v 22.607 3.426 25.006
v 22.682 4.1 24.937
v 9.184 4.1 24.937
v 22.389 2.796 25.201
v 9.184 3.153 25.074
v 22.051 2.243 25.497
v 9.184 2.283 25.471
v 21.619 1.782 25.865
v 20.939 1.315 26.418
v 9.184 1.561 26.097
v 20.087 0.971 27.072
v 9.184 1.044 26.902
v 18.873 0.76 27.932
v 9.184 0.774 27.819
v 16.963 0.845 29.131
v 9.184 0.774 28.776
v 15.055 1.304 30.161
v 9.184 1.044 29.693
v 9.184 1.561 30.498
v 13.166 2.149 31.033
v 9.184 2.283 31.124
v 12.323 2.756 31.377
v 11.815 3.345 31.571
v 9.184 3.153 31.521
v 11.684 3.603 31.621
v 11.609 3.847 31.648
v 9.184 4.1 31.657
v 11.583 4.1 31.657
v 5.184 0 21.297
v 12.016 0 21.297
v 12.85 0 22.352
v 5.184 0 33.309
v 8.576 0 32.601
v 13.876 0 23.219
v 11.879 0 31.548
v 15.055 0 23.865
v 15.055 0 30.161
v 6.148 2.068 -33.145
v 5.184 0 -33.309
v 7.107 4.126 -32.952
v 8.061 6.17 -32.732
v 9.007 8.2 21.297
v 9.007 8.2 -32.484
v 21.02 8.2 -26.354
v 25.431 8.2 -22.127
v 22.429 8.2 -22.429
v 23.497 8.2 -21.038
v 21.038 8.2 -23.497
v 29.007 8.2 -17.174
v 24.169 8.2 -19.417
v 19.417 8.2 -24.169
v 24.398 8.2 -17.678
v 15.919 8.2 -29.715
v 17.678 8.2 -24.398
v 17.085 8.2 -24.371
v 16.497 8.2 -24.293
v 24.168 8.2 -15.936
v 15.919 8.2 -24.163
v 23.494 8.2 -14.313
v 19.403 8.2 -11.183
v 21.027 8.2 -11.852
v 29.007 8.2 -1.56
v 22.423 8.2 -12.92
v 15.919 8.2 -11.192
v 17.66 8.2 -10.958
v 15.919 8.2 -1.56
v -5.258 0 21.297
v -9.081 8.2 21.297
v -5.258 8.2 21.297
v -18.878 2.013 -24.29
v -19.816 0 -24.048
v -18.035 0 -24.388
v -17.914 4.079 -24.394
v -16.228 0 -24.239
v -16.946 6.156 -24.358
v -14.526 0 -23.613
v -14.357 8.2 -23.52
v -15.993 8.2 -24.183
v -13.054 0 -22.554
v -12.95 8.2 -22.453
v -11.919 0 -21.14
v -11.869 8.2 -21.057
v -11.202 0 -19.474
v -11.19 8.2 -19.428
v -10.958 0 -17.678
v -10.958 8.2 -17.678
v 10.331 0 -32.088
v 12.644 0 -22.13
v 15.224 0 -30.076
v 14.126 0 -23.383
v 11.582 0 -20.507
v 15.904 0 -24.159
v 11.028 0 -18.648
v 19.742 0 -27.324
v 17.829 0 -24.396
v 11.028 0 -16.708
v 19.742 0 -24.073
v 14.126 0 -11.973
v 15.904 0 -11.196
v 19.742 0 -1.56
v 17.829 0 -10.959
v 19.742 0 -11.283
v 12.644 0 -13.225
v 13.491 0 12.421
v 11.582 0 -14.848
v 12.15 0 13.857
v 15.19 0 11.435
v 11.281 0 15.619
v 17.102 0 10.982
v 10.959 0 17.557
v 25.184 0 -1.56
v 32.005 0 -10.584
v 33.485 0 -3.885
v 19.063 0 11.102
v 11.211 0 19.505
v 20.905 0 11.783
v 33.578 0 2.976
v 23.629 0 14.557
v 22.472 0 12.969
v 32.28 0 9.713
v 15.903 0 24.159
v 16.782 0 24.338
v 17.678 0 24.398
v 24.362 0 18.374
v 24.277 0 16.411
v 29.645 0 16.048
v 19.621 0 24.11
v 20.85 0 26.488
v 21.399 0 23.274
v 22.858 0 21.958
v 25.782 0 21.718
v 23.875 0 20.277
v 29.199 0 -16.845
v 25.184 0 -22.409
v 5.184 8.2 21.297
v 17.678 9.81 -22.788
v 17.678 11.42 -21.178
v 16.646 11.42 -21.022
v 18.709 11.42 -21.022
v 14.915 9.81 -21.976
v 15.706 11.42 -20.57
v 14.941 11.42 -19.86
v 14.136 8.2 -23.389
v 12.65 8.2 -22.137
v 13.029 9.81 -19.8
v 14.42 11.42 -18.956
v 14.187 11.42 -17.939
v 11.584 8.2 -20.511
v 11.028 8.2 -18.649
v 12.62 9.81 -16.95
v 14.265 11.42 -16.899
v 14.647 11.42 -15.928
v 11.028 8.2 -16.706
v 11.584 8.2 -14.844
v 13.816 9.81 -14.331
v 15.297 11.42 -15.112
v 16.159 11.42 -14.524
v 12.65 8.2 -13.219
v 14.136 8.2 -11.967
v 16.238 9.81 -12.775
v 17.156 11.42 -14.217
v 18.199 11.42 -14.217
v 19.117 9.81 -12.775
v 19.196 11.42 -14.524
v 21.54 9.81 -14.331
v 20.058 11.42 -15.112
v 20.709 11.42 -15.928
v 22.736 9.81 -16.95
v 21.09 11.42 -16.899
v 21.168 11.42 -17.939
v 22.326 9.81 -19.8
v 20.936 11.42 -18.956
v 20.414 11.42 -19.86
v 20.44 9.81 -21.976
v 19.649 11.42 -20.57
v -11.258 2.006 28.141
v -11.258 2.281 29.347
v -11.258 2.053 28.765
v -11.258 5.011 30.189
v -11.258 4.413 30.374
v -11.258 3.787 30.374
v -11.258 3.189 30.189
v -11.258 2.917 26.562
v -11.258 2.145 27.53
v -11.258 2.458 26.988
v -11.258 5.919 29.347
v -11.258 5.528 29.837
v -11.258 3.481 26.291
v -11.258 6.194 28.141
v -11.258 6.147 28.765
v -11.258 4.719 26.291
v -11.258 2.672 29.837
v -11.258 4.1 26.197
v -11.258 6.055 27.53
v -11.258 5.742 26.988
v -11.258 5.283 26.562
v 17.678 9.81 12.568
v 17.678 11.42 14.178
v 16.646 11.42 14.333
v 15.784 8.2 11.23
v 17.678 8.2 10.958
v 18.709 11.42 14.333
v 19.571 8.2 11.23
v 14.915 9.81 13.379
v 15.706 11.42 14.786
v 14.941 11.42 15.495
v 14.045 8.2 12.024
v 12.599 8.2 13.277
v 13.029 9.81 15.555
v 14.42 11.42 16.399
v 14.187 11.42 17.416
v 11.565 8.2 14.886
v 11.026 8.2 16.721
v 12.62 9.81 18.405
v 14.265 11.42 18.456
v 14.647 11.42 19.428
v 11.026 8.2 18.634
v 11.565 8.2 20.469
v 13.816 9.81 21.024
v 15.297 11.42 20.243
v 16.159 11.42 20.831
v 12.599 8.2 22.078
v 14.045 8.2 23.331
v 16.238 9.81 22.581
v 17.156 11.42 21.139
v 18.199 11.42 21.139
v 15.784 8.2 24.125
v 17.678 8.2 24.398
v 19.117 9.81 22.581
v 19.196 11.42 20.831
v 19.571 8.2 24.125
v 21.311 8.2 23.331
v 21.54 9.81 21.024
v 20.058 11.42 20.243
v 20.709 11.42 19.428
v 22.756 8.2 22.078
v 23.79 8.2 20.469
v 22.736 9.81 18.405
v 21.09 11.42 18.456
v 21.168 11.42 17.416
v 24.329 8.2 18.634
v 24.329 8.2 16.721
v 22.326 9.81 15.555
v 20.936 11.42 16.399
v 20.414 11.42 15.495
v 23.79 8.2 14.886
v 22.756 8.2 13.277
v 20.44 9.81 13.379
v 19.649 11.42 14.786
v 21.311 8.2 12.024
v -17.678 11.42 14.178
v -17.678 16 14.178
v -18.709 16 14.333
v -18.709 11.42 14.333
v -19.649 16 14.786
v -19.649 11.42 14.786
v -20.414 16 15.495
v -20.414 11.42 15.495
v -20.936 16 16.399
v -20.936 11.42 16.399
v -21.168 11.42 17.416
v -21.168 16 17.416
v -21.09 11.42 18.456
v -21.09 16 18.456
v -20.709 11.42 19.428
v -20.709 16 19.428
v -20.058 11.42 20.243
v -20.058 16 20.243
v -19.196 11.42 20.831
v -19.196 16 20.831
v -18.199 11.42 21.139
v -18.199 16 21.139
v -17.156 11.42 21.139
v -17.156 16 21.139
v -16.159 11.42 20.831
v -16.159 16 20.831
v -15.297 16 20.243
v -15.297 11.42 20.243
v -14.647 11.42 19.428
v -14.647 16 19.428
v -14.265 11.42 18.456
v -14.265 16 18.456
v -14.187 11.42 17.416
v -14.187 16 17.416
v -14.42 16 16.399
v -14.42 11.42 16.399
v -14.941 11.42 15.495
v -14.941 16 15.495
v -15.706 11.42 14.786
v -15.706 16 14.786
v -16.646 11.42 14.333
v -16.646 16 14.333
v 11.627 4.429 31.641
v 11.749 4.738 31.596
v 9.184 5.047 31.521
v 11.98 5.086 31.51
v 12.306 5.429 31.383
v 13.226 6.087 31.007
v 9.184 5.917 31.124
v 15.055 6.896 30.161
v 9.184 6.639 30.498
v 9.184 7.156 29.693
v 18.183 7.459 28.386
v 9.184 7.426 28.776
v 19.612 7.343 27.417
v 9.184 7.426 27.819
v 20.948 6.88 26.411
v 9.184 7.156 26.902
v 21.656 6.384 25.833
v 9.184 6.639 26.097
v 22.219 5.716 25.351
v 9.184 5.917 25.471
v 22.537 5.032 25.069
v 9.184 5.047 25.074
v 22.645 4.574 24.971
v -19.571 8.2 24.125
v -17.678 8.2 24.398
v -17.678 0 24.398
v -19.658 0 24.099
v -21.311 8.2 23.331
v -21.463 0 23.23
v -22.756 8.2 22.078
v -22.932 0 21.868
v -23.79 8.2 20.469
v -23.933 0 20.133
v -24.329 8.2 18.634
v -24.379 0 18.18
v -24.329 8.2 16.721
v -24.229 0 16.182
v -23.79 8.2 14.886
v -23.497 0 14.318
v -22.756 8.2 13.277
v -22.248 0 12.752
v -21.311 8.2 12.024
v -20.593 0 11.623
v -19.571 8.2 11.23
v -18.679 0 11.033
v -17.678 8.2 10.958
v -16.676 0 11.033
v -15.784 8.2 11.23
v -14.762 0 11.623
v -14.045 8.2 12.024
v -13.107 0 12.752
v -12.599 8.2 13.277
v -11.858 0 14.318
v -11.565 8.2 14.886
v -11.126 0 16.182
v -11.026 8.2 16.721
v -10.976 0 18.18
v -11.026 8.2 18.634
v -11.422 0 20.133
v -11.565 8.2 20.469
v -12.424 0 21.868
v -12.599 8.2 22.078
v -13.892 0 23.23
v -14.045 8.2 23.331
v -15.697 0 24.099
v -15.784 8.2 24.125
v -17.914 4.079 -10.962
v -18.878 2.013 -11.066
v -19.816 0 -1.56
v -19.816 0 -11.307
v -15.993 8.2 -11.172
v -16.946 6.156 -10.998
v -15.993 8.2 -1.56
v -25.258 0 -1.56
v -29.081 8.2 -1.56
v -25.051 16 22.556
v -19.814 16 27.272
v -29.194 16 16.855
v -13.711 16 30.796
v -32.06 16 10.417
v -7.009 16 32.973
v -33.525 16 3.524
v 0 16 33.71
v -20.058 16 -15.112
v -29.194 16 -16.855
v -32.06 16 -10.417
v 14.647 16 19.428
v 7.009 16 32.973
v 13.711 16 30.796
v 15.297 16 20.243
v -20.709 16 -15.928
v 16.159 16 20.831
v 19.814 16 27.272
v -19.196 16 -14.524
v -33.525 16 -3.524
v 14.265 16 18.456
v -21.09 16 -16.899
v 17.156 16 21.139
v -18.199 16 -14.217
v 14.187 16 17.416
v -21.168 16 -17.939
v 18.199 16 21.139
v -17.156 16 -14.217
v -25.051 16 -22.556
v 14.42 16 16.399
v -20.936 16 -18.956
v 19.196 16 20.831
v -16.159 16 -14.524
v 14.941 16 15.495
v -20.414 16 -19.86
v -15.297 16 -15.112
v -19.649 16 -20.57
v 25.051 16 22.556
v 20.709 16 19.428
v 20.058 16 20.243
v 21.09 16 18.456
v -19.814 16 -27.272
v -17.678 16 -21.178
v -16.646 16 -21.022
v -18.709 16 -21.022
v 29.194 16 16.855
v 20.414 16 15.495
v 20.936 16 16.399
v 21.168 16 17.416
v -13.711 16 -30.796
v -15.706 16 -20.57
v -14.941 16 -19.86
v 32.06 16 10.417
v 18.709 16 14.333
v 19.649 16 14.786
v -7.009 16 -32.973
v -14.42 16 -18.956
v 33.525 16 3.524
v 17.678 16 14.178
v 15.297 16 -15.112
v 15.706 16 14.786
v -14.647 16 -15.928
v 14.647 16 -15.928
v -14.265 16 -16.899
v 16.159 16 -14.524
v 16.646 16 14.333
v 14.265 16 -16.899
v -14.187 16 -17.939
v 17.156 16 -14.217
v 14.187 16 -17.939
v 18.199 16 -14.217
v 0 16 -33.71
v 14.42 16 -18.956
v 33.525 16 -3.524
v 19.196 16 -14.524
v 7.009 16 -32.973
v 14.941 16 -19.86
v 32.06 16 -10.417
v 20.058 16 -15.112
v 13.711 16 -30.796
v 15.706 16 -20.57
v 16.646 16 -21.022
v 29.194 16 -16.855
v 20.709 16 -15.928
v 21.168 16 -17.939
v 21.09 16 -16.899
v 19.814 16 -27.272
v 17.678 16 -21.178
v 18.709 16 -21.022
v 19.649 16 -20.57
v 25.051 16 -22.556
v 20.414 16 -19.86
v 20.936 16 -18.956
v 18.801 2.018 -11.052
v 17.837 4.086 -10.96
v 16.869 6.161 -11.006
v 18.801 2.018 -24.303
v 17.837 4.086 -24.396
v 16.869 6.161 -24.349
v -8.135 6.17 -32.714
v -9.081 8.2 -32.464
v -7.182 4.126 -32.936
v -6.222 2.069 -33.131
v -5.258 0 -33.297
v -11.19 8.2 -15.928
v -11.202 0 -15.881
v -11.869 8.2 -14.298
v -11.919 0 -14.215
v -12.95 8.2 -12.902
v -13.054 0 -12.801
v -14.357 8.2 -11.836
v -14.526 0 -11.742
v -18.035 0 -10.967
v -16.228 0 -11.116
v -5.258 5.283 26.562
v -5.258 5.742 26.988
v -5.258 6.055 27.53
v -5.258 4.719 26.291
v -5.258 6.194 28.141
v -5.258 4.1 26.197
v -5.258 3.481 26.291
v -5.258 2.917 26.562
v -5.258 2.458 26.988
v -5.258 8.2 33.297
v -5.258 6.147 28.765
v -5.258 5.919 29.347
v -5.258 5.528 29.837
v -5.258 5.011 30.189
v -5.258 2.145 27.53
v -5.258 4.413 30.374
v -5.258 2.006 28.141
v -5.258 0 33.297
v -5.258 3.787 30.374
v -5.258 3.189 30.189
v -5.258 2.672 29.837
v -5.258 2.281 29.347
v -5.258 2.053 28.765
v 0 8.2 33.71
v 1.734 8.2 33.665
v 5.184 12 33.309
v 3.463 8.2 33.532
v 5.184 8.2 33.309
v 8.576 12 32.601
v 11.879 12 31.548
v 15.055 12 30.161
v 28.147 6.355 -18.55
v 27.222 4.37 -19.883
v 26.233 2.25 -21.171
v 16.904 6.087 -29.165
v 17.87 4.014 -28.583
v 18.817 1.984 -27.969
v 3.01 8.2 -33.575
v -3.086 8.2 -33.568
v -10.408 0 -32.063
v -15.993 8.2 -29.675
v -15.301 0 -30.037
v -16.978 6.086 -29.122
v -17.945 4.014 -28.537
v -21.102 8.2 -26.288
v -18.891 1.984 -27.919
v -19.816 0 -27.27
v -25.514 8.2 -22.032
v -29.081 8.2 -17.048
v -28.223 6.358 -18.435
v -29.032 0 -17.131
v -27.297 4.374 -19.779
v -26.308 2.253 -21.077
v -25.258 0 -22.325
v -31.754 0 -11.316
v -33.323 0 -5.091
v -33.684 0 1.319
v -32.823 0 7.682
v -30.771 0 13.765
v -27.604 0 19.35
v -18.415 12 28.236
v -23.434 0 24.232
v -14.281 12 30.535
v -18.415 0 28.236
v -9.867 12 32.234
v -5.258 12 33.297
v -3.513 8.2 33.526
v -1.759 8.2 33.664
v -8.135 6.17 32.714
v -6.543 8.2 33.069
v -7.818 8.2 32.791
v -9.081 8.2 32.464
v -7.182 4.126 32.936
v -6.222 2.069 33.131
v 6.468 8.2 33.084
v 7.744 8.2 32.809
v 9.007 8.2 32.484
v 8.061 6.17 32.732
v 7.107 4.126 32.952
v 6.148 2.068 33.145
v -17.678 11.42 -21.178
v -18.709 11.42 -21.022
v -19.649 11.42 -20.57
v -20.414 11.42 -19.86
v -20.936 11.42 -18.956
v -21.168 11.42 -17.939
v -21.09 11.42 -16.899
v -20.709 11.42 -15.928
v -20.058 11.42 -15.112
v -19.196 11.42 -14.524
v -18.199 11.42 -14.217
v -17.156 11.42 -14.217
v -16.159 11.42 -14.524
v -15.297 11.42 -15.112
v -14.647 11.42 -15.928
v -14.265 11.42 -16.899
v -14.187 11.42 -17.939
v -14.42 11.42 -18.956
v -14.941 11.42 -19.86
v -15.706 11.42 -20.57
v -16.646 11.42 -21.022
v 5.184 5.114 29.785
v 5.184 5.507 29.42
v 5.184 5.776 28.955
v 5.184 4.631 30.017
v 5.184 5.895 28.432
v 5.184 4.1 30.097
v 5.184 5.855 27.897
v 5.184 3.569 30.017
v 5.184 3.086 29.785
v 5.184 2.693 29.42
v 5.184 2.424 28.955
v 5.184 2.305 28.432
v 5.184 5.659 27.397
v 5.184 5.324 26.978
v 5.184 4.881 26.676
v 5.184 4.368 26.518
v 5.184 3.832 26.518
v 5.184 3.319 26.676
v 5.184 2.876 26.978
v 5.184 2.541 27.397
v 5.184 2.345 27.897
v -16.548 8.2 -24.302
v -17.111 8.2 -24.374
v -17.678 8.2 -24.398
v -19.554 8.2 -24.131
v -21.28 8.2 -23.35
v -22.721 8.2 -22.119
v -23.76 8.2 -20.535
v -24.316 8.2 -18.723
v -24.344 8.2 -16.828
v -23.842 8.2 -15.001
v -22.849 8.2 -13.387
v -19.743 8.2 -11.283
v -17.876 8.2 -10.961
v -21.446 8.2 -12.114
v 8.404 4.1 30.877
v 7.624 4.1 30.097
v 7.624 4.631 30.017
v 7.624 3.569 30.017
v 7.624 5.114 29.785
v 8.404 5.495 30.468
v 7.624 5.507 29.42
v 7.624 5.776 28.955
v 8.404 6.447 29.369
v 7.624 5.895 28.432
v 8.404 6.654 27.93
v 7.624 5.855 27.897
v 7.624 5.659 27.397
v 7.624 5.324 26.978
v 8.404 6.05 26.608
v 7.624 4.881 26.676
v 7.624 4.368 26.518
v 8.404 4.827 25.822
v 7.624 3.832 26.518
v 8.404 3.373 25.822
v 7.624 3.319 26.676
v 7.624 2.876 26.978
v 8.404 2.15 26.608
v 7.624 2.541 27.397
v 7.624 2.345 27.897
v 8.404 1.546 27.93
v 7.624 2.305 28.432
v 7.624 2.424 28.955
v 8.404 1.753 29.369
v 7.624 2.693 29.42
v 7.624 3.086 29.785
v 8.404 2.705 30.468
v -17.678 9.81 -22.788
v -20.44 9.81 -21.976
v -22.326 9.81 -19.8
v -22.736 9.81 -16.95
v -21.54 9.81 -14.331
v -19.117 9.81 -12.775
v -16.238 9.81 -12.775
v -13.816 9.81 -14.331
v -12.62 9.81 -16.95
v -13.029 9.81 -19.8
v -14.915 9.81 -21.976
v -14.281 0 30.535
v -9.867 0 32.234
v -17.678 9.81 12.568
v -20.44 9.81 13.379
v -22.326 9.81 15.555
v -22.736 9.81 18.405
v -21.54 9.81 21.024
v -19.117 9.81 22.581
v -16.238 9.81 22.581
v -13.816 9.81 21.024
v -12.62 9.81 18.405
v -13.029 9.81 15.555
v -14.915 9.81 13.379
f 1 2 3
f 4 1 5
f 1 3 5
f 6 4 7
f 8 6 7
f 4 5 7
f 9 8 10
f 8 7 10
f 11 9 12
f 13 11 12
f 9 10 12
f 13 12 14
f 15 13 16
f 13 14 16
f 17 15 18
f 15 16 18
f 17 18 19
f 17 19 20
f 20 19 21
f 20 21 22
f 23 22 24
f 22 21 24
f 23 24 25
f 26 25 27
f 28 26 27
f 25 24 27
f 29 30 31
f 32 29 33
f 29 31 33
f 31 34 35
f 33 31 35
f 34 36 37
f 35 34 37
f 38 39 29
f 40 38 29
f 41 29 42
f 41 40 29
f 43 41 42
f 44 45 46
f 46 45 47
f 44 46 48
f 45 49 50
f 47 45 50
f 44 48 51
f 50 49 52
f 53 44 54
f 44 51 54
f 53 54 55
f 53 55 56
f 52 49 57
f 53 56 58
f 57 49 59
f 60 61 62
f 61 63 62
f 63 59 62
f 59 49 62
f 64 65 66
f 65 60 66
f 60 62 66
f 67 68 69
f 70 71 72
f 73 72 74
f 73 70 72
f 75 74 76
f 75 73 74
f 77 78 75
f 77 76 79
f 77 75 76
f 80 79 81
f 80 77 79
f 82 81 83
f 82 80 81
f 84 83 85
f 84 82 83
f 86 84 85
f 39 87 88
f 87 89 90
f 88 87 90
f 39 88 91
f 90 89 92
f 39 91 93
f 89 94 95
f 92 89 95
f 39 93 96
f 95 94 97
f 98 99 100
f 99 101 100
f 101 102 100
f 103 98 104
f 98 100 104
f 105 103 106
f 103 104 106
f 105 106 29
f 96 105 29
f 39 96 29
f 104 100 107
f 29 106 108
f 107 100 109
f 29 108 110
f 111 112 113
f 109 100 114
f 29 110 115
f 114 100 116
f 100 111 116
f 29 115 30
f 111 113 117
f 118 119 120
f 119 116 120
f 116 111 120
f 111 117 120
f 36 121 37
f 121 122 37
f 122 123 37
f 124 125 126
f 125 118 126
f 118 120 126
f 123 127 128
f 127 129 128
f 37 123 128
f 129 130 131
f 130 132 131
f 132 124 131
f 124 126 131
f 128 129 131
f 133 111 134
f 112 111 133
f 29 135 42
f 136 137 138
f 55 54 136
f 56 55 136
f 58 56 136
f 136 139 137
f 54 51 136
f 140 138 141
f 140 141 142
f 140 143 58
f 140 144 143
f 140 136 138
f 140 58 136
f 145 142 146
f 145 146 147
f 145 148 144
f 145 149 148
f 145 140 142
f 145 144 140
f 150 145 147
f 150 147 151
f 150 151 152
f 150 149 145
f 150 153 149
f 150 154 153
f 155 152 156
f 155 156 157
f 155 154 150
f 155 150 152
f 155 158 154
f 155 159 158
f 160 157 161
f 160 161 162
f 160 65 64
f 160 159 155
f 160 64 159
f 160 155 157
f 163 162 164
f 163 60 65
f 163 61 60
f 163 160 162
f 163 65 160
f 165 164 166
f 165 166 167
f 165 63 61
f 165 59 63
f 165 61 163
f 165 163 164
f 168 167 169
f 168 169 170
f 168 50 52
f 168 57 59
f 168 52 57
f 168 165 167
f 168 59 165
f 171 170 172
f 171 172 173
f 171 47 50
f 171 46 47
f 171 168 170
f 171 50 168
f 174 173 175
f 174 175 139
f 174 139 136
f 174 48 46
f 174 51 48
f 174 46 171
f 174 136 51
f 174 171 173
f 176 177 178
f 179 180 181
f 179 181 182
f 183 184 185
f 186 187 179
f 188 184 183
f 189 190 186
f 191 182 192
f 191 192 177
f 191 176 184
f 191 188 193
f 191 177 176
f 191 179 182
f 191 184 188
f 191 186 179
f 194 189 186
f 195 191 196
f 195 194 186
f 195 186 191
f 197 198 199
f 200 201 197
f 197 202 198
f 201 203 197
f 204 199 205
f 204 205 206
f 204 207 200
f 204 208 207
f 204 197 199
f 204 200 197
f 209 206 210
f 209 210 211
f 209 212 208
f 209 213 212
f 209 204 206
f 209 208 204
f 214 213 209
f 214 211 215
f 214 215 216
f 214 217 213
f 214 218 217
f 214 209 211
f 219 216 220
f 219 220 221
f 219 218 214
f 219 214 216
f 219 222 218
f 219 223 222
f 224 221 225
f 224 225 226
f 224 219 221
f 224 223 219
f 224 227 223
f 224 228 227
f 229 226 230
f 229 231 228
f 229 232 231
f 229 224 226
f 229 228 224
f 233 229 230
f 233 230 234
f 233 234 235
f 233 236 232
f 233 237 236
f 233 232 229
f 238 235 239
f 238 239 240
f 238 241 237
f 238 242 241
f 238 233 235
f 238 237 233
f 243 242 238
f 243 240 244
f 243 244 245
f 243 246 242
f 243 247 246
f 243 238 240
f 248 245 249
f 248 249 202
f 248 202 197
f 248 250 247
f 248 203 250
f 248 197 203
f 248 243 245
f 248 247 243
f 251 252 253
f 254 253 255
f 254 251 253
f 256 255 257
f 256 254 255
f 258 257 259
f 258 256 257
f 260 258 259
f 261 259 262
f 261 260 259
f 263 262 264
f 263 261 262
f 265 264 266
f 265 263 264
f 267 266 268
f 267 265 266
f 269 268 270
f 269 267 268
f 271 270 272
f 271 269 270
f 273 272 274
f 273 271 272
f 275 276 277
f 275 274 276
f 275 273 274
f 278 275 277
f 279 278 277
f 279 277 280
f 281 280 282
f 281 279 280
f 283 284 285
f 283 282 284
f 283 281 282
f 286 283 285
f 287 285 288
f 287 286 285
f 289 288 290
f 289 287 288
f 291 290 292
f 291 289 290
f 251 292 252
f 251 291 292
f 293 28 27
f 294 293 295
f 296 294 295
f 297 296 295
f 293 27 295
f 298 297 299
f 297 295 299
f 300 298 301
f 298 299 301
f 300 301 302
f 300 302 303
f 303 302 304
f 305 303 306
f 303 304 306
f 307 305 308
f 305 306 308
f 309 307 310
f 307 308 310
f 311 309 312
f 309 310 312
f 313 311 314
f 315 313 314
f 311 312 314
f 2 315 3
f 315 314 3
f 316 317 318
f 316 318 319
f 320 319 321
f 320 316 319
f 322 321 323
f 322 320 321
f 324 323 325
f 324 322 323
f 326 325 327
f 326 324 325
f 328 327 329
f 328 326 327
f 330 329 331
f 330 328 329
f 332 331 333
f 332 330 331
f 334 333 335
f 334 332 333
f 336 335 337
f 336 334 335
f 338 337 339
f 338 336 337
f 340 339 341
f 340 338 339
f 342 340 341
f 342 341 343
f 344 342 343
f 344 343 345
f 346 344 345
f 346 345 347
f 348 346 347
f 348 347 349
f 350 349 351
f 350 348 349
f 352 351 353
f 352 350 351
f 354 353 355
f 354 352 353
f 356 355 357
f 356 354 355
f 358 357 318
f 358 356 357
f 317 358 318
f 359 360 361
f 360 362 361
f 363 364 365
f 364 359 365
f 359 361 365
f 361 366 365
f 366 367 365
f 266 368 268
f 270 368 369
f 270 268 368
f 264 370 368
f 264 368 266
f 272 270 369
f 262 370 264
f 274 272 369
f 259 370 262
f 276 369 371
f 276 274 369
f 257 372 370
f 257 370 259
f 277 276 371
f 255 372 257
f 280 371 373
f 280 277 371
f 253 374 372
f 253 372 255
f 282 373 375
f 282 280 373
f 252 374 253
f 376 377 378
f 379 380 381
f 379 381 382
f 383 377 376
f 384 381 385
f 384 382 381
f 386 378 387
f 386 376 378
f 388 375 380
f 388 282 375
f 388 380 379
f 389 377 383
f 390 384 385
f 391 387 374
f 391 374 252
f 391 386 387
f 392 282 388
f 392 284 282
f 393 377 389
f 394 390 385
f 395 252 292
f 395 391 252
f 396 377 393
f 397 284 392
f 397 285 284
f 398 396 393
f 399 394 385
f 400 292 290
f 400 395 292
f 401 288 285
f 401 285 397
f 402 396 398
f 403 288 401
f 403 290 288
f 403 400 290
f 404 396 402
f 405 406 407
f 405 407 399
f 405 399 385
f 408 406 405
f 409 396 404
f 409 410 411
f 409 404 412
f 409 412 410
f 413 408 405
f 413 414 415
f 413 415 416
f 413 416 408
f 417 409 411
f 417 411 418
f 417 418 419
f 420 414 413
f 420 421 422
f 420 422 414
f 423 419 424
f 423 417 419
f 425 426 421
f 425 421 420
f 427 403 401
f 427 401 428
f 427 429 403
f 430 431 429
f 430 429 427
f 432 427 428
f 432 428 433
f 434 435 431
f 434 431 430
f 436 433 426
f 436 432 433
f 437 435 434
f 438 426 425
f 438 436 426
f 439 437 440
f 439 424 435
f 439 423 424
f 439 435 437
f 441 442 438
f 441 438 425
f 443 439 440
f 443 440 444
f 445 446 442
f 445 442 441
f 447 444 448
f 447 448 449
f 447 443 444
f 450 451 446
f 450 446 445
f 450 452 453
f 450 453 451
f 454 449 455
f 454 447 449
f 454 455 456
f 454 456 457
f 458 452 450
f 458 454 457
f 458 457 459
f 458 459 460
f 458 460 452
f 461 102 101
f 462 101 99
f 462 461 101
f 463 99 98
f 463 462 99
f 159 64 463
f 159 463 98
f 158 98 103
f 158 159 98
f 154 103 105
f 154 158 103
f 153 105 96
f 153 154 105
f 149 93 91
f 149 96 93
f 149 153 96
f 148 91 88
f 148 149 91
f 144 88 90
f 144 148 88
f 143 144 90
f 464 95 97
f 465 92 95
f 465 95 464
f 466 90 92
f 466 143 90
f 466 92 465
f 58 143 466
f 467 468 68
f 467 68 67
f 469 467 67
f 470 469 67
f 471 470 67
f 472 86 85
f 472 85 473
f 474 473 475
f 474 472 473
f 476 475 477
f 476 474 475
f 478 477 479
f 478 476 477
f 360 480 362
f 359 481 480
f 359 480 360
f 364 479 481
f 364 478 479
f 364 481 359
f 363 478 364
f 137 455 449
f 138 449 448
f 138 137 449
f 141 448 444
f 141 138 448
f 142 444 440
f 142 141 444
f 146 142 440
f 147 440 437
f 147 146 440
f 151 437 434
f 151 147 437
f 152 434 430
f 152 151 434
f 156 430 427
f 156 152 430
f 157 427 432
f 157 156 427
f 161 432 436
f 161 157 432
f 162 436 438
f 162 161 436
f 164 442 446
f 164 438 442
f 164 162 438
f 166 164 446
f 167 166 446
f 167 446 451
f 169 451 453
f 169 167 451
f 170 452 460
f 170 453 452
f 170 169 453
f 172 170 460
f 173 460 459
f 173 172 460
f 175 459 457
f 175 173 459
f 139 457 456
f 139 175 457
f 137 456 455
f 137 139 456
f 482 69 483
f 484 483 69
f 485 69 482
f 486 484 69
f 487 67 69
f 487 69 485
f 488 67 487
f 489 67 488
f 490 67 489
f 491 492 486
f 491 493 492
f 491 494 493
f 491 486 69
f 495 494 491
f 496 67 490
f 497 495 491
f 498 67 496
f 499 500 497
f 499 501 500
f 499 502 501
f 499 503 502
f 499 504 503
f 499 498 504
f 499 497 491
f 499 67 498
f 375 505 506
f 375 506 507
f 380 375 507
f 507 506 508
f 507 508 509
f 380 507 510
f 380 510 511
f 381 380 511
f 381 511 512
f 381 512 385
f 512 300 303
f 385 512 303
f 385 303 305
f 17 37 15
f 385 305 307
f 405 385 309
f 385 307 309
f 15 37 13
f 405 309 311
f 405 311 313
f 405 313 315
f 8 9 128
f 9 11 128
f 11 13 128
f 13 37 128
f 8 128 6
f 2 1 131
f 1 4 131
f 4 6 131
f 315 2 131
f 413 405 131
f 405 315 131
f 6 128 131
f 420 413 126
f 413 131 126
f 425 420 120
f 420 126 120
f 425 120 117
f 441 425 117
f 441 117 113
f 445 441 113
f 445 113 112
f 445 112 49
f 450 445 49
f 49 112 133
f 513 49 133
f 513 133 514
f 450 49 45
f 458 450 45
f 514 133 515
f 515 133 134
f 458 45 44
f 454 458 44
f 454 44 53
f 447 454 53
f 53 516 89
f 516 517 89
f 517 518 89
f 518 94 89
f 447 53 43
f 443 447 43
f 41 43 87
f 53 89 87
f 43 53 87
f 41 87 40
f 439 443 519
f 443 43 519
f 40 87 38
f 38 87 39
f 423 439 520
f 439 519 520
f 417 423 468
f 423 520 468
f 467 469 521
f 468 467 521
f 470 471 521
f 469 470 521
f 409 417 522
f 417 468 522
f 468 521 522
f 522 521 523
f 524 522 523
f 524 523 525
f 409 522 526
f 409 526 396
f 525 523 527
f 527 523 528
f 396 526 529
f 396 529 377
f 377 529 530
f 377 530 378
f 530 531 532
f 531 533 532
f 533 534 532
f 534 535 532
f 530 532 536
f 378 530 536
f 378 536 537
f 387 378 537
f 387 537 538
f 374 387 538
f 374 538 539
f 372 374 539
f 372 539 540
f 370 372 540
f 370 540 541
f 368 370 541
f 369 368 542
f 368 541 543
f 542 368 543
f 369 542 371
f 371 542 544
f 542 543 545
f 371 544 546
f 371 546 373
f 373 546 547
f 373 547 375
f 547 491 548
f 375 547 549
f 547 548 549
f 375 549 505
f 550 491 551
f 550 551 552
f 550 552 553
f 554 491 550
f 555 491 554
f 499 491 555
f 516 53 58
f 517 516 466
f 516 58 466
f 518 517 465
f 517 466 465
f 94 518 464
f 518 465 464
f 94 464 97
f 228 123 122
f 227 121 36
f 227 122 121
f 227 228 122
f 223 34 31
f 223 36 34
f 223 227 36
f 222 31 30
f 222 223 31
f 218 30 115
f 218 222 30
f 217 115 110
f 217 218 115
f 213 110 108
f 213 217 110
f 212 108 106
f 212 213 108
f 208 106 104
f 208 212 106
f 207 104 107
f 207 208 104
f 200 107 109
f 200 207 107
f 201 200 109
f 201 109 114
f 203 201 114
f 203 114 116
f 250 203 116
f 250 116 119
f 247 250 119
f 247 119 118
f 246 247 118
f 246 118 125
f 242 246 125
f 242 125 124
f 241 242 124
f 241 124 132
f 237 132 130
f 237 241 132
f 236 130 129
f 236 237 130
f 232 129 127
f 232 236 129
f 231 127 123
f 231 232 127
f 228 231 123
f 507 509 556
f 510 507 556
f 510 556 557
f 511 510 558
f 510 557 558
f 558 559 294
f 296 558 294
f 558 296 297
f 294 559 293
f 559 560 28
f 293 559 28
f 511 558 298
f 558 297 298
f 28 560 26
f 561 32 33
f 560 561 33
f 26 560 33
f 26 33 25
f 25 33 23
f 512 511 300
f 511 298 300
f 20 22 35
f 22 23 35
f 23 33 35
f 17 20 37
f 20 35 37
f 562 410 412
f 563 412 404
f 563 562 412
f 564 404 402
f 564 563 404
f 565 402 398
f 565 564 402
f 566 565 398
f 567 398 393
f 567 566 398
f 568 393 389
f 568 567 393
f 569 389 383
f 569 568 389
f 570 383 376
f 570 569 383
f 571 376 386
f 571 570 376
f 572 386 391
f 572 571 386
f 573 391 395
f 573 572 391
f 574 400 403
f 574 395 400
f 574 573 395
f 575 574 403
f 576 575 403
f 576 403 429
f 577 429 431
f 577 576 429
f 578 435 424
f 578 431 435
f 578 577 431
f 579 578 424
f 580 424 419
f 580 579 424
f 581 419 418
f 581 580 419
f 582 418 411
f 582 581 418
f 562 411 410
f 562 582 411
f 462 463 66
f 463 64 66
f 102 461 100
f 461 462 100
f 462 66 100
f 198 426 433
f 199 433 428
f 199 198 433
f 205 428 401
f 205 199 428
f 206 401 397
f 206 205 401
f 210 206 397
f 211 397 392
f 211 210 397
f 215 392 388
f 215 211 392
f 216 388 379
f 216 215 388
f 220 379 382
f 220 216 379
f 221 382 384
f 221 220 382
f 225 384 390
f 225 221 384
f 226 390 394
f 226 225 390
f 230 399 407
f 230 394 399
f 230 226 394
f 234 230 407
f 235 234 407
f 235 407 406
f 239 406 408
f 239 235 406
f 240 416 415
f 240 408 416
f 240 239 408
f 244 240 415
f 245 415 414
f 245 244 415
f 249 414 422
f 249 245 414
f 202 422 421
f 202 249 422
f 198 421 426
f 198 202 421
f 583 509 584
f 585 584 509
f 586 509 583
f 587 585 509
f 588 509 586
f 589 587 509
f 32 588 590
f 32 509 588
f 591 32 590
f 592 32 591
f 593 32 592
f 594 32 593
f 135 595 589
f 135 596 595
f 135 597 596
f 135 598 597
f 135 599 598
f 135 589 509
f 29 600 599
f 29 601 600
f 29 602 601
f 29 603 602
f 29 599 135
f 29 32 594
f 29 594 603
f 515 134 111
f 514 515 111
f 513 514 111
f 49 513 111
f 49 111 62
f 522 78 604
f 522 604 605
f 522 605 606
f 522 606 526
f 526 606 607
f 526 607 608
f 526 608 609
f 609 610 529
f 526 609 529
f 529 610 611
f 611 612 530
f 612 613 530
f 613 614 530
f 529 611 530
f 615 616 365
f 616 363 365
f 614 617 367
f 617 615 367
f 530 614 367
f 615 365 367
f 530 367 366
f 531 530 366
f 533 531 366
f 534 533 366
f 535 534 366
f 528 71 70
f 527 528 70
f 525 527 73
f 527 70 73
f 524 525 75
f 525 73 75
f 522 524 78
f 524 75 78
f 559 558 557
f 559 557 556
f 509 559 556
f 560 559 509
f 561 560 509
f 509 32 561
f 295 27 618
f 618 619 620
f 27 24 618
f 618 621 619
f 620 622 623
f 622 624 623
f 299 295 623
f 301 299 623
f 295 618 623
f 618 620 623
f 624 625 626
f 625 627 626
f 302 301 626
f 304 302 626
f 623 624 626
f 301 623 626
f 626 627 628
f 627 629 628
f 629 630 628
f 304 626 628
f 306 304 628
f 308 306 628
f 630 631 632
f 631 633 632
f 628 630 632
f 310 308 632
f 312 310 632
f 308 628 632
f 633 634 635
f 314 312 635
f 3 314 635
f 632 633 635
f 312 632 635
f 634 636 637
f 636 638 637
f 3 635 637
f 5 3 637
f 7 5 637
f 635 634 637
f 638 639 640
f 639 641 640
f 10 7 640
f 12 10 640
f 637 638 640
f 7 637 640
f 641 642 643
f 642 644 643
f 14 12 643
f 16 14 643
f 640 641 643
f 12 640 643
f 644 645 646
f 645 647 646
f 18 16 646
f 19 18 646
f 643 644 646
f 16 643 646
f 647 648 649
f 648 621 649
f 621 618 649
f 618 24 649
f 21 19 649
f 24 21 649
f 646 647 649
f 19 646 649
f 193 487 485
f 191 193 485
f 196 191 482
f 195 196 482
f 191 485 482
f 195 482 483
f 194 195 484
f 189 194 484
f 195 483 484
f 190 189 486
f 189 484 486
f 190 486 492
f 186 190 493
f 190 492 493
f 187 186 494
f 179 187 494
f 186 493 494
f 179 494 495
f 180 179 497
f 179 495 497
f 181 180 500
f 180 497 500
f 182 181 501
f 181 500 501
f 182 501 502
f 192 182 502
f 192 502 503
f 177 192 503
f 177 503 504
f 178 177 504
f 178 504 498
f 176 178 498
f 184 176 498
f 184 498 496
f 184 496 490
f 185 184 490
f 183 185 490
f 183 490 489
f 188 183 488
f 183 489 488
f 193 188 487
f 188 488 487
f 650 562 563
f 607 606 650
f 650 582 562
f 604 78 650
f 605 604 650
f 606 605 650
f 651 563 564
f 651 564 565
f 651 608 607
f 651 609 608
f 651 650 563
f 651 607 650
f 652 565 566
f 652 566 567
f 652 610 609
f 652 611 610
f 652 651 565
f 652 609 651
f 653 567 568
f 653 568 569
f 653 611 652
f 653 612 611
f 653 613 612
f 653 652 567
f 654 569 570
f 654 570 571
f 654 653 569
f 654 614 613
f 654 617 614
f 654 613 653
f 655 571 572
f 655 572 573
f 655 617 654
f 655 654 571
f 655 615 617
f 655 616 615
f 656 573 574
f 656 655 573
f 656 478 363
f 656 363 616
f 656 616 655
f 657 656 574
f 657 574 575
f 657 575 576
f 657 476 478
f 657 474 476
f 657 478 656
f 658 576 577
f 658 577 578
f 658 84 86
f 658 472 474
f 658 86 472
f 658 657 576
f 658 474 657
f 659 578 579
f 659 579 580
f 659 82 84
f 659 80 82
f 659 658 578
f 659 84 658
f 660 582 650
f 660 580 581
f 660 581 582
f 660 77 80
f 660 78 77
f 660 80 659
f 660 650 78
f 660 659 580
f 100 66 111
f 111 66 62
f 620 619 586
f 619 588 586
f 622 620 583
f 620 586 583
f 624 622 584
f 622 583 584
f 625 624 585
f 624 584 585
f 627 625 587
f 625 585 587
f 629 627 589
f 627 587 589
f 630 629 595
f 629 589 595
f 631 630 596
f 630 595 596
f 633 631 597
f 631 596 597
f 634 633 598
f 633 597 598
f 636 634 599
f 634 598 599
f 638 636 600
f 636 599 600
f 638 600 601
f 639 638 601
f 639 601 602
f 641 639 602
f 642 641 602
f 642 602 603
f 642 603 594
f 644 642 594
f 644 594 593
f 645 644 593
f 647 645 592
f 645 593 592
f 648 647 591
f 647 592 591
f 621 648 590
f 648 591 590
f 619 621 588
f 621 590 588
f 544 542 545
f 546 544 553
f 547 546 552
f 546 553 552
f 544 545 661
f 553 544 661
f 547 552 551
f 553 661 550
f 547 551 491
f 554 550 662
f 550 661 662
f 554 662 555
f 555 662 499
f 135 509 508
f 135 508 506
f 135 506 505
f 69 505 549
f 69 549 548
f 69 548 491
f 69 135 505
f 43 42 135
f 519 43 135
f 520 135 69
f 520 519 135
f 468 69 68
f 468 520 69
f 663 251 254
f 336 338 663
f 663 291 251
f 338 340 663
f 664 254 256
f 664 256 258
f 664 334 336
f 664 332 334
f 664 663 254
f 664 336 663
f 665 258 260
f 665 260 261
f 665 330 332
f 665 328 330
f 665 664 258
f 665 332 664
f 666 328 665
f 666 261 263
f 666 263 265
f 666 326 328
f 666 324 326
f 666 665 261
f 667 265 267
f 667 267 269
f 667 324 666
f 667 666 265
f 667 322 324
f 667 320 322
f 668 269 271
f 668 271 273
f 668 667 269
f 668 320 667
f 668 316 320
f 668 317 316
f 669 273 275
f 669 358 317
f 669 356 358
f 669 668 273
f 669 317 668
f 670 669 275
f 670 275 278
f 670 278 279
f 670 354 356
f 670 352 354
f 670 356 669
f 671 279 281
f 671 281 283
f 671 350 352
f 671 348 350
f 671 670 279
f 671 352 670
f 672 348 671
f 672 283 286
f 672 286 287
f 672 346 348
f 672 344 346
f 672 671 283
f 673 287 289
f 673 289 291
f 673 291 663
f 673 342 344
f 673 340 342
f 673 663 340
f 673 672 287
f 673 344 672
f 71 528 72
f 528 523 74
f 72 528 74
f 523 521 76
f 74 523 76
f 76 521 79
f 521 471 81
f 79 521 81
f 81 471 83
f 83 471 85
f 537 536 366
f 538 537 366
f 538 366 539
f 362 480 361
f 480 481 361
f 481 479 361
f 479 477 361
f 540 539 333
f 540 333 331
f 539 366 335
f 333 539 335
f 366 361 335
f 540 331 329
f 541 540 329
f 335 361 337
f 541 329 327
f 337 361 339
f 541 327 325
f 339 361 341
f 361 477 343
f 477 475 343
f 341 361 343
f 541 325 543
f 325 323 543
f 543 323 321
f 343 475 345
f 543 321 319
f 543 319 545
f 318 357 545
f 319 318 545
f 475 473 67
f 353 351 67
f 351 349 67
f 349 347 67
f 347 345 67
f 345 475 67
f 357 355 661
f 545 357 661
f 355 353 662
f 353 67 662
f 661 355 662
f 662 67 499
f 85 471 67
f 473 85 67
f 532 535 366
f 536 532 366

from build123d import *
from build123d.topology import SkipClean

# Parameters (mm, degrees)
SKETCH63_R                                           = 33.71
BOSS_EXTRUDE14_DEPTH                                 = 30
CUT_EXTRUDE16_START                                  = -1.56
CUT_EXTRUDE16_DEPTH                                  = 55.766975775
CUT_EXTRUDE17_DEPTH                                  = 57.326975775
CUT_EXTRUDE17_DEPTH_BACK                             = 57.326975775
BOSS_EXTRUDE15_DEPTH                                 = 12
CUT_EXTRUDE18_START                                  = -5.22
SKETCH69_R                                           = 2.1
CUT_EXTRUDE18_DEPTH                                  = 6
SKETCH70_R                                           = 3.36
SKETCH70_R_2                                         = 2.1
CUT_EXTRUDE19_DEPTH                                  = 63.259333256
CSK_FOR_M3_HEX_SOCKET_COUNTERSUNK_CAP_SC_D           = 3.6
CSK_FOR_M3_HEX_SOCKET_COUNTERSUNK_CAP_SC_DEPTH       = 14.440351168
CSK_FOR_M3_HEX_SOCKET_COUNTERSUNK_CAP_SC_CSINK_D     = 6.72
CSK_FOR_M3_HEX_SOCKET_COUNTERSUNK_CAP_SC_CSINK_ANGLE = 90
CSK_FOR_M3_HEX_SOCKET_COUNTERSUNK_CAP_SC_TIP         = 1.081549114
SKETCH74_R                                           = 44.614790837
CUT_EXTRUDE20_DEPTH                                  = 14
CSK_FOR_M6_HEX_SOCKET_COUNTERSUNK_CA_2_COUNT         = 2
CSK_FOR_M6_HEX_SOCKET_COUNTERSUNK_CA_2_PITCH         = 35.355339059
CSK_FOR_M6_HEX_SOCKET_COUNTERSUNK_CA_3_COUNT         = 2
CSK_FOR_M6_HEX_SOCKET_COUNTERSUNK_CA_3_PITCH         = 35.355339059
CSK_FOR_M6_HEX_SOCKET_COUNTERSUNK_CA_4_COUNT         = 2
CSK_FOR_M6_HEX_SOCKET_COUNTERSUNK_CA_4_PITCH         = 50
SKETCH79_R                                           = 6.72
CUT_EXTRUDE21_DEPTH                                  = 15


with BuildPart() as part:
    # Sketch63 → Boss-Extrude14 (new body)
    with BuildSketch(Plane(origin=(0, 0, 0), x_dir=(1, 0, 0), z_dir=(0, 1, 0))):
        with Locations(Location((0, 0, 0), (0, 0, 270))):
            Circle(SKETCH63_R)
    extrude(amount=BOSS_EXTRUDE14_DEPTH)

    # Sketch67 → Cut-Extrude16 (cut, through all)
    with BuildSketch(Plane.XY.offset(CUT_EXTRUDE16_START)):
        Polygon((-25.257756337, 0), (-19.816405169, 0), (-15.992682372, 8.2), (-29.081479134, 8.2), align=None)
        Polygon((19.742243663, 0), (25.183594831, 0), (29.007317628, 8.2), (15.918520866, 8.2), align=None)
    extrude(amount=-CUT_EXTRUDE16_DEPTH, mode=Mode.SUBTRACT)

    # Sketch67<3> → Cut-Extrude17 (cut, two sides: drawn at the far end of the back side and taken through both)
    with BuildSketch(Plane.XY.offset(-CUT_EXTRUDE17_DEPTH_BACK)):
        Polygon((-5.257756337, 0), (5.183594831, 0), (9.007317628, 8.2), (-9.081479134, 8.2), align=None)
    extrude(amount=CUT_EXTRUDE17_DEPTH + CUT_EXTRUDE17_DEPTH_BACK, mode=Mode.SUBTRACT)

    # Sketch68 → Boss-Extrude15 (add)
    with SkipClean():  # the faces are left unmerged after this step: merging them gives an invalid solid
        with BuildSketch(Plane.XZ):
            with BuildLine():
                Line((-5.257756337, 21.297448826), (-5.257756337, 33.297448826))
                ThreePointArc((-5.257756337, 33.297448826), (-12.10394362, 31.462019148), (-18.415011022, 28.235641821))
                Line((-18.415011022, 28.235641821), (-18.415011022, 21.297448826))
                Line((-18.415011022, 21.297448826), (-5.257756337, 21.297448826))
            make_face()
            with BuildLine():
                ThreePointArc((15.05537339, 30.161230613), (10.24115174, 32.116707662), (5.183594831, 33.309074509))
                Line((5.183594831, 33.309074509), (5.183594831, 21.297448826))
                Line((5.183594831, 21.297448826), (15.05537339, 21.297448826))
                Line((15.05537339, 21.297448826), (15.05537339, 30.161230613))
            make_face()
        extrude(amount=-BOSS_EXTRUDE15_DEPTH)

    # Sketch69 → Cut-Extrude18 (cut)
    with SkipClean():  # the faces are left unmerged after this step: merging them gives an invalid solid
        with BuildSketch(Plane(origin=(-0.037756337, 0, 0), x_dir=(0, 0, -1), z_dir=(1, 0, 0)).offset(CUT_EXTRUDE18_START)):
            with Locations((-28.297448826, 4.1)):
                Circle(SKETCH69_R)
        extrude(amount=-CUT_EXTRUDE18_DEPTH, mode=Mode.SUBTRACT)

    # Sketch70 → Cut-Extrude19 (cut, through all)
    # profile 1 of 2: a face of its own
    with SkipClean():  # the faces are left unmerged after this step: merging them gives an invalid solid
        with BuildSketch(Plane.ZY.offset(-9.183594831)):
            with Locations((28.297448826, 4.1)):
                Circle(SKETCH70_R)
            with Locations(Location((28.297448826, 4.1, 0), (0, 0, 180))):
                Circle(SKETCH70_R_2, mode=Mode.SUBTRACT)
        # profile 2 of 2: a face of its own
        with BuildSketch(Plane.ZY.offset(-9.183594831)):
            with Locations(Location((28.297448826, 4.1, 0), (0, 0, 180))):
                Circle(SKETCH70_R_2)
        extrude(amount=-CUT_EXTRUDE19_DEPTH, mode=Mode.SUBTRACT)

    # CSK for M3 Hex Socket Countersunk Cap Screw9
    with Locations(Plane(origin=(9.183594831, 0, 0), x_dir=(0, 0, -1), z_dir=(1, 0, 0))):
        with Locations((-28.297448826, 4.1)):
            CounterSinkHole(CSK_FOR_M3_HEX_SOCKET_COUNTERSUNK_CAP_SC_D / 2, CSK_FOR_M3_HEX_SOCKET_COUNTERSUNK_CAP_SC_CSINK_D / 2, depth=CSK_FOR_M3_HEX_SOCKET_COUNTERSUNK_CAP_SC_DEPTH, counter_sink_angle=CSK_FOR_M3_HEX_SOCKET_COUNTERSUNK_CAP_SC_CSINK_ANGLE)
            with Locations((0, 0, -(CSK_FOR_M3_HEX_SOCKET_COUNTERSUNK_CAP_SC_DEPTH + CSK_FOR_M3_HEX_SOCKET_COUNTERSUNK_CAP_SC_TIP / 2))):  # 118° drill point
                Cone(0, CSK_FOR_M3_HEX_SOCKET_COUNTERSUNK_CAP_SC_D / 2, CSK_FOR_M3_HEX_SOCKET_COUNTERSUNK_CAP_SC_TIP, mode=Mode.SUBTRACT)

    # Sketch74 → Cut-Extrude20 (cut)
    with SkipClean():  # the faces are left unmerged after this step: merging them gives an invalid solid
        with BuildSketch(Plane(origin=(0, 30, 0), x_dir=(1, 0, 0), z_dir=(0, 1, 0))):
            Circle(SKETCH74_R)
        extrude(amount=-CUT_EXTRUDE20_DEPTH, mode=Mode.SUBTRACT)

    # Sketch78 → CSK for M6 Hex Socket Countersunk Cap Screw4 (revolve, cut)
    with SkipClean():  # the faces are left unmerged after this step: merging them gives an invalid solid
        with BuildSketch(Plane(origin=(-17.67766953, 8.2, 17.67766953), x_dir=(0, 0, -1), z_dir=(1, 0, 0))):
            Polygon((0, 0), (0, 16.543012167), (3.5, 14.44), (3.5, 3.22), (6.72, 0), align=None)
        csk_for_m6_hex_socket_countersunk_cap_sc = revolve(axis=Axis((-17.67766953, 1.85, 17.67766953), (0, 1, 0)), mode=Mode.SUBTRACT)

    # CSK for M6 Hex Socket Countersunk Ca 2: CSK for M6 Hex Socket Countersunk Cap Screw4 ×2
    with SkipClean():  # the faces are left unmerged after this step: merging them gives an invalid solid
        with Locations(*[(i * CSK_FOR_M6_HEX_SOCKET_COUNTERSUNK_CA_2_PITCH, 0, 0) for i in range(1, CSK_FOR_M6_HEX_SOCKET_COUNTERSUNK_CA_2_COUNT)]):
            add(csk_for_m6_hex_socket_countersunk_cap_sc, mode=Mode.SUBTRACT)

    # CSK for M6 Hex Socket Countersunk Ca 3: CSK for M6 Hex Socket Countersunk Cap Screw4 ×2
    with SkipClean():  # the faces are left unmerged after this step: merging them gives an invalid solid
        with Locations(*[(0, 0, -i * CSK_FOR_M6_HEX_SOCKET_COUNTERSUNK_CA_3_PITCH) for i in range(1, CSK_FOR_M6_HEX_SOCKET_COUNTERSUNK_CA_3_COUNT)]):
            add(csk_for_m6_hex_socket_countersunk_cap_sc, mode=Mode.SUBTRACT)

    # CSK for M6 Hex Socket Countersunk Ca 4: CSK for M6 Hex Socket Countersunk Cap Screw4 ×2
    with SkipClean():  # the faces are left unmerged after this step: merging them gives an invalid solid
        with Locations(*[Vector(0.7071067811865438, 0, -0.7071067811865512) * (i * CSK_FOR_M6_HEX_SOCKET_COUNTERSUNK_CA_4_PITCH) for i in range(1, CSK_FOR_M6_HEX_SOCKET_COUNTERSUNK_CA_4_COUNT)]):
            add(csk_for_m6_hex_socket_countersunk_cap_sc, mode=Mode.SUBTRACT)

    # Sketch79 → Cut-Extrude21 (cut)
    with SkipClean():  # the faces are left unmerged after this step: merging them gives an invalid solid
        with BuildSketch(Plane.XZ.offset(-8.2)):
            with Locations((-17.67766953, -17.67766953)):
                Circle(SKETCH79_R)
            with Locations((17.67766953, -17.67766953)):
                Circle(SKETCH79_R)
            with Locations(Location((17.67766953, 17.67766953, 0), (0, 0, 90))):
                Circle(SKETCH79_R)
            with Locations(Location((-17.67766953, 17.67766953, 0), (0, 0, 90))):
                Circle(SKETCH79_R)
        extrude(amount=CUT_EXTRUDE21_DEPTH, mode=Mode.SUBTRACT)


solid = part.part
